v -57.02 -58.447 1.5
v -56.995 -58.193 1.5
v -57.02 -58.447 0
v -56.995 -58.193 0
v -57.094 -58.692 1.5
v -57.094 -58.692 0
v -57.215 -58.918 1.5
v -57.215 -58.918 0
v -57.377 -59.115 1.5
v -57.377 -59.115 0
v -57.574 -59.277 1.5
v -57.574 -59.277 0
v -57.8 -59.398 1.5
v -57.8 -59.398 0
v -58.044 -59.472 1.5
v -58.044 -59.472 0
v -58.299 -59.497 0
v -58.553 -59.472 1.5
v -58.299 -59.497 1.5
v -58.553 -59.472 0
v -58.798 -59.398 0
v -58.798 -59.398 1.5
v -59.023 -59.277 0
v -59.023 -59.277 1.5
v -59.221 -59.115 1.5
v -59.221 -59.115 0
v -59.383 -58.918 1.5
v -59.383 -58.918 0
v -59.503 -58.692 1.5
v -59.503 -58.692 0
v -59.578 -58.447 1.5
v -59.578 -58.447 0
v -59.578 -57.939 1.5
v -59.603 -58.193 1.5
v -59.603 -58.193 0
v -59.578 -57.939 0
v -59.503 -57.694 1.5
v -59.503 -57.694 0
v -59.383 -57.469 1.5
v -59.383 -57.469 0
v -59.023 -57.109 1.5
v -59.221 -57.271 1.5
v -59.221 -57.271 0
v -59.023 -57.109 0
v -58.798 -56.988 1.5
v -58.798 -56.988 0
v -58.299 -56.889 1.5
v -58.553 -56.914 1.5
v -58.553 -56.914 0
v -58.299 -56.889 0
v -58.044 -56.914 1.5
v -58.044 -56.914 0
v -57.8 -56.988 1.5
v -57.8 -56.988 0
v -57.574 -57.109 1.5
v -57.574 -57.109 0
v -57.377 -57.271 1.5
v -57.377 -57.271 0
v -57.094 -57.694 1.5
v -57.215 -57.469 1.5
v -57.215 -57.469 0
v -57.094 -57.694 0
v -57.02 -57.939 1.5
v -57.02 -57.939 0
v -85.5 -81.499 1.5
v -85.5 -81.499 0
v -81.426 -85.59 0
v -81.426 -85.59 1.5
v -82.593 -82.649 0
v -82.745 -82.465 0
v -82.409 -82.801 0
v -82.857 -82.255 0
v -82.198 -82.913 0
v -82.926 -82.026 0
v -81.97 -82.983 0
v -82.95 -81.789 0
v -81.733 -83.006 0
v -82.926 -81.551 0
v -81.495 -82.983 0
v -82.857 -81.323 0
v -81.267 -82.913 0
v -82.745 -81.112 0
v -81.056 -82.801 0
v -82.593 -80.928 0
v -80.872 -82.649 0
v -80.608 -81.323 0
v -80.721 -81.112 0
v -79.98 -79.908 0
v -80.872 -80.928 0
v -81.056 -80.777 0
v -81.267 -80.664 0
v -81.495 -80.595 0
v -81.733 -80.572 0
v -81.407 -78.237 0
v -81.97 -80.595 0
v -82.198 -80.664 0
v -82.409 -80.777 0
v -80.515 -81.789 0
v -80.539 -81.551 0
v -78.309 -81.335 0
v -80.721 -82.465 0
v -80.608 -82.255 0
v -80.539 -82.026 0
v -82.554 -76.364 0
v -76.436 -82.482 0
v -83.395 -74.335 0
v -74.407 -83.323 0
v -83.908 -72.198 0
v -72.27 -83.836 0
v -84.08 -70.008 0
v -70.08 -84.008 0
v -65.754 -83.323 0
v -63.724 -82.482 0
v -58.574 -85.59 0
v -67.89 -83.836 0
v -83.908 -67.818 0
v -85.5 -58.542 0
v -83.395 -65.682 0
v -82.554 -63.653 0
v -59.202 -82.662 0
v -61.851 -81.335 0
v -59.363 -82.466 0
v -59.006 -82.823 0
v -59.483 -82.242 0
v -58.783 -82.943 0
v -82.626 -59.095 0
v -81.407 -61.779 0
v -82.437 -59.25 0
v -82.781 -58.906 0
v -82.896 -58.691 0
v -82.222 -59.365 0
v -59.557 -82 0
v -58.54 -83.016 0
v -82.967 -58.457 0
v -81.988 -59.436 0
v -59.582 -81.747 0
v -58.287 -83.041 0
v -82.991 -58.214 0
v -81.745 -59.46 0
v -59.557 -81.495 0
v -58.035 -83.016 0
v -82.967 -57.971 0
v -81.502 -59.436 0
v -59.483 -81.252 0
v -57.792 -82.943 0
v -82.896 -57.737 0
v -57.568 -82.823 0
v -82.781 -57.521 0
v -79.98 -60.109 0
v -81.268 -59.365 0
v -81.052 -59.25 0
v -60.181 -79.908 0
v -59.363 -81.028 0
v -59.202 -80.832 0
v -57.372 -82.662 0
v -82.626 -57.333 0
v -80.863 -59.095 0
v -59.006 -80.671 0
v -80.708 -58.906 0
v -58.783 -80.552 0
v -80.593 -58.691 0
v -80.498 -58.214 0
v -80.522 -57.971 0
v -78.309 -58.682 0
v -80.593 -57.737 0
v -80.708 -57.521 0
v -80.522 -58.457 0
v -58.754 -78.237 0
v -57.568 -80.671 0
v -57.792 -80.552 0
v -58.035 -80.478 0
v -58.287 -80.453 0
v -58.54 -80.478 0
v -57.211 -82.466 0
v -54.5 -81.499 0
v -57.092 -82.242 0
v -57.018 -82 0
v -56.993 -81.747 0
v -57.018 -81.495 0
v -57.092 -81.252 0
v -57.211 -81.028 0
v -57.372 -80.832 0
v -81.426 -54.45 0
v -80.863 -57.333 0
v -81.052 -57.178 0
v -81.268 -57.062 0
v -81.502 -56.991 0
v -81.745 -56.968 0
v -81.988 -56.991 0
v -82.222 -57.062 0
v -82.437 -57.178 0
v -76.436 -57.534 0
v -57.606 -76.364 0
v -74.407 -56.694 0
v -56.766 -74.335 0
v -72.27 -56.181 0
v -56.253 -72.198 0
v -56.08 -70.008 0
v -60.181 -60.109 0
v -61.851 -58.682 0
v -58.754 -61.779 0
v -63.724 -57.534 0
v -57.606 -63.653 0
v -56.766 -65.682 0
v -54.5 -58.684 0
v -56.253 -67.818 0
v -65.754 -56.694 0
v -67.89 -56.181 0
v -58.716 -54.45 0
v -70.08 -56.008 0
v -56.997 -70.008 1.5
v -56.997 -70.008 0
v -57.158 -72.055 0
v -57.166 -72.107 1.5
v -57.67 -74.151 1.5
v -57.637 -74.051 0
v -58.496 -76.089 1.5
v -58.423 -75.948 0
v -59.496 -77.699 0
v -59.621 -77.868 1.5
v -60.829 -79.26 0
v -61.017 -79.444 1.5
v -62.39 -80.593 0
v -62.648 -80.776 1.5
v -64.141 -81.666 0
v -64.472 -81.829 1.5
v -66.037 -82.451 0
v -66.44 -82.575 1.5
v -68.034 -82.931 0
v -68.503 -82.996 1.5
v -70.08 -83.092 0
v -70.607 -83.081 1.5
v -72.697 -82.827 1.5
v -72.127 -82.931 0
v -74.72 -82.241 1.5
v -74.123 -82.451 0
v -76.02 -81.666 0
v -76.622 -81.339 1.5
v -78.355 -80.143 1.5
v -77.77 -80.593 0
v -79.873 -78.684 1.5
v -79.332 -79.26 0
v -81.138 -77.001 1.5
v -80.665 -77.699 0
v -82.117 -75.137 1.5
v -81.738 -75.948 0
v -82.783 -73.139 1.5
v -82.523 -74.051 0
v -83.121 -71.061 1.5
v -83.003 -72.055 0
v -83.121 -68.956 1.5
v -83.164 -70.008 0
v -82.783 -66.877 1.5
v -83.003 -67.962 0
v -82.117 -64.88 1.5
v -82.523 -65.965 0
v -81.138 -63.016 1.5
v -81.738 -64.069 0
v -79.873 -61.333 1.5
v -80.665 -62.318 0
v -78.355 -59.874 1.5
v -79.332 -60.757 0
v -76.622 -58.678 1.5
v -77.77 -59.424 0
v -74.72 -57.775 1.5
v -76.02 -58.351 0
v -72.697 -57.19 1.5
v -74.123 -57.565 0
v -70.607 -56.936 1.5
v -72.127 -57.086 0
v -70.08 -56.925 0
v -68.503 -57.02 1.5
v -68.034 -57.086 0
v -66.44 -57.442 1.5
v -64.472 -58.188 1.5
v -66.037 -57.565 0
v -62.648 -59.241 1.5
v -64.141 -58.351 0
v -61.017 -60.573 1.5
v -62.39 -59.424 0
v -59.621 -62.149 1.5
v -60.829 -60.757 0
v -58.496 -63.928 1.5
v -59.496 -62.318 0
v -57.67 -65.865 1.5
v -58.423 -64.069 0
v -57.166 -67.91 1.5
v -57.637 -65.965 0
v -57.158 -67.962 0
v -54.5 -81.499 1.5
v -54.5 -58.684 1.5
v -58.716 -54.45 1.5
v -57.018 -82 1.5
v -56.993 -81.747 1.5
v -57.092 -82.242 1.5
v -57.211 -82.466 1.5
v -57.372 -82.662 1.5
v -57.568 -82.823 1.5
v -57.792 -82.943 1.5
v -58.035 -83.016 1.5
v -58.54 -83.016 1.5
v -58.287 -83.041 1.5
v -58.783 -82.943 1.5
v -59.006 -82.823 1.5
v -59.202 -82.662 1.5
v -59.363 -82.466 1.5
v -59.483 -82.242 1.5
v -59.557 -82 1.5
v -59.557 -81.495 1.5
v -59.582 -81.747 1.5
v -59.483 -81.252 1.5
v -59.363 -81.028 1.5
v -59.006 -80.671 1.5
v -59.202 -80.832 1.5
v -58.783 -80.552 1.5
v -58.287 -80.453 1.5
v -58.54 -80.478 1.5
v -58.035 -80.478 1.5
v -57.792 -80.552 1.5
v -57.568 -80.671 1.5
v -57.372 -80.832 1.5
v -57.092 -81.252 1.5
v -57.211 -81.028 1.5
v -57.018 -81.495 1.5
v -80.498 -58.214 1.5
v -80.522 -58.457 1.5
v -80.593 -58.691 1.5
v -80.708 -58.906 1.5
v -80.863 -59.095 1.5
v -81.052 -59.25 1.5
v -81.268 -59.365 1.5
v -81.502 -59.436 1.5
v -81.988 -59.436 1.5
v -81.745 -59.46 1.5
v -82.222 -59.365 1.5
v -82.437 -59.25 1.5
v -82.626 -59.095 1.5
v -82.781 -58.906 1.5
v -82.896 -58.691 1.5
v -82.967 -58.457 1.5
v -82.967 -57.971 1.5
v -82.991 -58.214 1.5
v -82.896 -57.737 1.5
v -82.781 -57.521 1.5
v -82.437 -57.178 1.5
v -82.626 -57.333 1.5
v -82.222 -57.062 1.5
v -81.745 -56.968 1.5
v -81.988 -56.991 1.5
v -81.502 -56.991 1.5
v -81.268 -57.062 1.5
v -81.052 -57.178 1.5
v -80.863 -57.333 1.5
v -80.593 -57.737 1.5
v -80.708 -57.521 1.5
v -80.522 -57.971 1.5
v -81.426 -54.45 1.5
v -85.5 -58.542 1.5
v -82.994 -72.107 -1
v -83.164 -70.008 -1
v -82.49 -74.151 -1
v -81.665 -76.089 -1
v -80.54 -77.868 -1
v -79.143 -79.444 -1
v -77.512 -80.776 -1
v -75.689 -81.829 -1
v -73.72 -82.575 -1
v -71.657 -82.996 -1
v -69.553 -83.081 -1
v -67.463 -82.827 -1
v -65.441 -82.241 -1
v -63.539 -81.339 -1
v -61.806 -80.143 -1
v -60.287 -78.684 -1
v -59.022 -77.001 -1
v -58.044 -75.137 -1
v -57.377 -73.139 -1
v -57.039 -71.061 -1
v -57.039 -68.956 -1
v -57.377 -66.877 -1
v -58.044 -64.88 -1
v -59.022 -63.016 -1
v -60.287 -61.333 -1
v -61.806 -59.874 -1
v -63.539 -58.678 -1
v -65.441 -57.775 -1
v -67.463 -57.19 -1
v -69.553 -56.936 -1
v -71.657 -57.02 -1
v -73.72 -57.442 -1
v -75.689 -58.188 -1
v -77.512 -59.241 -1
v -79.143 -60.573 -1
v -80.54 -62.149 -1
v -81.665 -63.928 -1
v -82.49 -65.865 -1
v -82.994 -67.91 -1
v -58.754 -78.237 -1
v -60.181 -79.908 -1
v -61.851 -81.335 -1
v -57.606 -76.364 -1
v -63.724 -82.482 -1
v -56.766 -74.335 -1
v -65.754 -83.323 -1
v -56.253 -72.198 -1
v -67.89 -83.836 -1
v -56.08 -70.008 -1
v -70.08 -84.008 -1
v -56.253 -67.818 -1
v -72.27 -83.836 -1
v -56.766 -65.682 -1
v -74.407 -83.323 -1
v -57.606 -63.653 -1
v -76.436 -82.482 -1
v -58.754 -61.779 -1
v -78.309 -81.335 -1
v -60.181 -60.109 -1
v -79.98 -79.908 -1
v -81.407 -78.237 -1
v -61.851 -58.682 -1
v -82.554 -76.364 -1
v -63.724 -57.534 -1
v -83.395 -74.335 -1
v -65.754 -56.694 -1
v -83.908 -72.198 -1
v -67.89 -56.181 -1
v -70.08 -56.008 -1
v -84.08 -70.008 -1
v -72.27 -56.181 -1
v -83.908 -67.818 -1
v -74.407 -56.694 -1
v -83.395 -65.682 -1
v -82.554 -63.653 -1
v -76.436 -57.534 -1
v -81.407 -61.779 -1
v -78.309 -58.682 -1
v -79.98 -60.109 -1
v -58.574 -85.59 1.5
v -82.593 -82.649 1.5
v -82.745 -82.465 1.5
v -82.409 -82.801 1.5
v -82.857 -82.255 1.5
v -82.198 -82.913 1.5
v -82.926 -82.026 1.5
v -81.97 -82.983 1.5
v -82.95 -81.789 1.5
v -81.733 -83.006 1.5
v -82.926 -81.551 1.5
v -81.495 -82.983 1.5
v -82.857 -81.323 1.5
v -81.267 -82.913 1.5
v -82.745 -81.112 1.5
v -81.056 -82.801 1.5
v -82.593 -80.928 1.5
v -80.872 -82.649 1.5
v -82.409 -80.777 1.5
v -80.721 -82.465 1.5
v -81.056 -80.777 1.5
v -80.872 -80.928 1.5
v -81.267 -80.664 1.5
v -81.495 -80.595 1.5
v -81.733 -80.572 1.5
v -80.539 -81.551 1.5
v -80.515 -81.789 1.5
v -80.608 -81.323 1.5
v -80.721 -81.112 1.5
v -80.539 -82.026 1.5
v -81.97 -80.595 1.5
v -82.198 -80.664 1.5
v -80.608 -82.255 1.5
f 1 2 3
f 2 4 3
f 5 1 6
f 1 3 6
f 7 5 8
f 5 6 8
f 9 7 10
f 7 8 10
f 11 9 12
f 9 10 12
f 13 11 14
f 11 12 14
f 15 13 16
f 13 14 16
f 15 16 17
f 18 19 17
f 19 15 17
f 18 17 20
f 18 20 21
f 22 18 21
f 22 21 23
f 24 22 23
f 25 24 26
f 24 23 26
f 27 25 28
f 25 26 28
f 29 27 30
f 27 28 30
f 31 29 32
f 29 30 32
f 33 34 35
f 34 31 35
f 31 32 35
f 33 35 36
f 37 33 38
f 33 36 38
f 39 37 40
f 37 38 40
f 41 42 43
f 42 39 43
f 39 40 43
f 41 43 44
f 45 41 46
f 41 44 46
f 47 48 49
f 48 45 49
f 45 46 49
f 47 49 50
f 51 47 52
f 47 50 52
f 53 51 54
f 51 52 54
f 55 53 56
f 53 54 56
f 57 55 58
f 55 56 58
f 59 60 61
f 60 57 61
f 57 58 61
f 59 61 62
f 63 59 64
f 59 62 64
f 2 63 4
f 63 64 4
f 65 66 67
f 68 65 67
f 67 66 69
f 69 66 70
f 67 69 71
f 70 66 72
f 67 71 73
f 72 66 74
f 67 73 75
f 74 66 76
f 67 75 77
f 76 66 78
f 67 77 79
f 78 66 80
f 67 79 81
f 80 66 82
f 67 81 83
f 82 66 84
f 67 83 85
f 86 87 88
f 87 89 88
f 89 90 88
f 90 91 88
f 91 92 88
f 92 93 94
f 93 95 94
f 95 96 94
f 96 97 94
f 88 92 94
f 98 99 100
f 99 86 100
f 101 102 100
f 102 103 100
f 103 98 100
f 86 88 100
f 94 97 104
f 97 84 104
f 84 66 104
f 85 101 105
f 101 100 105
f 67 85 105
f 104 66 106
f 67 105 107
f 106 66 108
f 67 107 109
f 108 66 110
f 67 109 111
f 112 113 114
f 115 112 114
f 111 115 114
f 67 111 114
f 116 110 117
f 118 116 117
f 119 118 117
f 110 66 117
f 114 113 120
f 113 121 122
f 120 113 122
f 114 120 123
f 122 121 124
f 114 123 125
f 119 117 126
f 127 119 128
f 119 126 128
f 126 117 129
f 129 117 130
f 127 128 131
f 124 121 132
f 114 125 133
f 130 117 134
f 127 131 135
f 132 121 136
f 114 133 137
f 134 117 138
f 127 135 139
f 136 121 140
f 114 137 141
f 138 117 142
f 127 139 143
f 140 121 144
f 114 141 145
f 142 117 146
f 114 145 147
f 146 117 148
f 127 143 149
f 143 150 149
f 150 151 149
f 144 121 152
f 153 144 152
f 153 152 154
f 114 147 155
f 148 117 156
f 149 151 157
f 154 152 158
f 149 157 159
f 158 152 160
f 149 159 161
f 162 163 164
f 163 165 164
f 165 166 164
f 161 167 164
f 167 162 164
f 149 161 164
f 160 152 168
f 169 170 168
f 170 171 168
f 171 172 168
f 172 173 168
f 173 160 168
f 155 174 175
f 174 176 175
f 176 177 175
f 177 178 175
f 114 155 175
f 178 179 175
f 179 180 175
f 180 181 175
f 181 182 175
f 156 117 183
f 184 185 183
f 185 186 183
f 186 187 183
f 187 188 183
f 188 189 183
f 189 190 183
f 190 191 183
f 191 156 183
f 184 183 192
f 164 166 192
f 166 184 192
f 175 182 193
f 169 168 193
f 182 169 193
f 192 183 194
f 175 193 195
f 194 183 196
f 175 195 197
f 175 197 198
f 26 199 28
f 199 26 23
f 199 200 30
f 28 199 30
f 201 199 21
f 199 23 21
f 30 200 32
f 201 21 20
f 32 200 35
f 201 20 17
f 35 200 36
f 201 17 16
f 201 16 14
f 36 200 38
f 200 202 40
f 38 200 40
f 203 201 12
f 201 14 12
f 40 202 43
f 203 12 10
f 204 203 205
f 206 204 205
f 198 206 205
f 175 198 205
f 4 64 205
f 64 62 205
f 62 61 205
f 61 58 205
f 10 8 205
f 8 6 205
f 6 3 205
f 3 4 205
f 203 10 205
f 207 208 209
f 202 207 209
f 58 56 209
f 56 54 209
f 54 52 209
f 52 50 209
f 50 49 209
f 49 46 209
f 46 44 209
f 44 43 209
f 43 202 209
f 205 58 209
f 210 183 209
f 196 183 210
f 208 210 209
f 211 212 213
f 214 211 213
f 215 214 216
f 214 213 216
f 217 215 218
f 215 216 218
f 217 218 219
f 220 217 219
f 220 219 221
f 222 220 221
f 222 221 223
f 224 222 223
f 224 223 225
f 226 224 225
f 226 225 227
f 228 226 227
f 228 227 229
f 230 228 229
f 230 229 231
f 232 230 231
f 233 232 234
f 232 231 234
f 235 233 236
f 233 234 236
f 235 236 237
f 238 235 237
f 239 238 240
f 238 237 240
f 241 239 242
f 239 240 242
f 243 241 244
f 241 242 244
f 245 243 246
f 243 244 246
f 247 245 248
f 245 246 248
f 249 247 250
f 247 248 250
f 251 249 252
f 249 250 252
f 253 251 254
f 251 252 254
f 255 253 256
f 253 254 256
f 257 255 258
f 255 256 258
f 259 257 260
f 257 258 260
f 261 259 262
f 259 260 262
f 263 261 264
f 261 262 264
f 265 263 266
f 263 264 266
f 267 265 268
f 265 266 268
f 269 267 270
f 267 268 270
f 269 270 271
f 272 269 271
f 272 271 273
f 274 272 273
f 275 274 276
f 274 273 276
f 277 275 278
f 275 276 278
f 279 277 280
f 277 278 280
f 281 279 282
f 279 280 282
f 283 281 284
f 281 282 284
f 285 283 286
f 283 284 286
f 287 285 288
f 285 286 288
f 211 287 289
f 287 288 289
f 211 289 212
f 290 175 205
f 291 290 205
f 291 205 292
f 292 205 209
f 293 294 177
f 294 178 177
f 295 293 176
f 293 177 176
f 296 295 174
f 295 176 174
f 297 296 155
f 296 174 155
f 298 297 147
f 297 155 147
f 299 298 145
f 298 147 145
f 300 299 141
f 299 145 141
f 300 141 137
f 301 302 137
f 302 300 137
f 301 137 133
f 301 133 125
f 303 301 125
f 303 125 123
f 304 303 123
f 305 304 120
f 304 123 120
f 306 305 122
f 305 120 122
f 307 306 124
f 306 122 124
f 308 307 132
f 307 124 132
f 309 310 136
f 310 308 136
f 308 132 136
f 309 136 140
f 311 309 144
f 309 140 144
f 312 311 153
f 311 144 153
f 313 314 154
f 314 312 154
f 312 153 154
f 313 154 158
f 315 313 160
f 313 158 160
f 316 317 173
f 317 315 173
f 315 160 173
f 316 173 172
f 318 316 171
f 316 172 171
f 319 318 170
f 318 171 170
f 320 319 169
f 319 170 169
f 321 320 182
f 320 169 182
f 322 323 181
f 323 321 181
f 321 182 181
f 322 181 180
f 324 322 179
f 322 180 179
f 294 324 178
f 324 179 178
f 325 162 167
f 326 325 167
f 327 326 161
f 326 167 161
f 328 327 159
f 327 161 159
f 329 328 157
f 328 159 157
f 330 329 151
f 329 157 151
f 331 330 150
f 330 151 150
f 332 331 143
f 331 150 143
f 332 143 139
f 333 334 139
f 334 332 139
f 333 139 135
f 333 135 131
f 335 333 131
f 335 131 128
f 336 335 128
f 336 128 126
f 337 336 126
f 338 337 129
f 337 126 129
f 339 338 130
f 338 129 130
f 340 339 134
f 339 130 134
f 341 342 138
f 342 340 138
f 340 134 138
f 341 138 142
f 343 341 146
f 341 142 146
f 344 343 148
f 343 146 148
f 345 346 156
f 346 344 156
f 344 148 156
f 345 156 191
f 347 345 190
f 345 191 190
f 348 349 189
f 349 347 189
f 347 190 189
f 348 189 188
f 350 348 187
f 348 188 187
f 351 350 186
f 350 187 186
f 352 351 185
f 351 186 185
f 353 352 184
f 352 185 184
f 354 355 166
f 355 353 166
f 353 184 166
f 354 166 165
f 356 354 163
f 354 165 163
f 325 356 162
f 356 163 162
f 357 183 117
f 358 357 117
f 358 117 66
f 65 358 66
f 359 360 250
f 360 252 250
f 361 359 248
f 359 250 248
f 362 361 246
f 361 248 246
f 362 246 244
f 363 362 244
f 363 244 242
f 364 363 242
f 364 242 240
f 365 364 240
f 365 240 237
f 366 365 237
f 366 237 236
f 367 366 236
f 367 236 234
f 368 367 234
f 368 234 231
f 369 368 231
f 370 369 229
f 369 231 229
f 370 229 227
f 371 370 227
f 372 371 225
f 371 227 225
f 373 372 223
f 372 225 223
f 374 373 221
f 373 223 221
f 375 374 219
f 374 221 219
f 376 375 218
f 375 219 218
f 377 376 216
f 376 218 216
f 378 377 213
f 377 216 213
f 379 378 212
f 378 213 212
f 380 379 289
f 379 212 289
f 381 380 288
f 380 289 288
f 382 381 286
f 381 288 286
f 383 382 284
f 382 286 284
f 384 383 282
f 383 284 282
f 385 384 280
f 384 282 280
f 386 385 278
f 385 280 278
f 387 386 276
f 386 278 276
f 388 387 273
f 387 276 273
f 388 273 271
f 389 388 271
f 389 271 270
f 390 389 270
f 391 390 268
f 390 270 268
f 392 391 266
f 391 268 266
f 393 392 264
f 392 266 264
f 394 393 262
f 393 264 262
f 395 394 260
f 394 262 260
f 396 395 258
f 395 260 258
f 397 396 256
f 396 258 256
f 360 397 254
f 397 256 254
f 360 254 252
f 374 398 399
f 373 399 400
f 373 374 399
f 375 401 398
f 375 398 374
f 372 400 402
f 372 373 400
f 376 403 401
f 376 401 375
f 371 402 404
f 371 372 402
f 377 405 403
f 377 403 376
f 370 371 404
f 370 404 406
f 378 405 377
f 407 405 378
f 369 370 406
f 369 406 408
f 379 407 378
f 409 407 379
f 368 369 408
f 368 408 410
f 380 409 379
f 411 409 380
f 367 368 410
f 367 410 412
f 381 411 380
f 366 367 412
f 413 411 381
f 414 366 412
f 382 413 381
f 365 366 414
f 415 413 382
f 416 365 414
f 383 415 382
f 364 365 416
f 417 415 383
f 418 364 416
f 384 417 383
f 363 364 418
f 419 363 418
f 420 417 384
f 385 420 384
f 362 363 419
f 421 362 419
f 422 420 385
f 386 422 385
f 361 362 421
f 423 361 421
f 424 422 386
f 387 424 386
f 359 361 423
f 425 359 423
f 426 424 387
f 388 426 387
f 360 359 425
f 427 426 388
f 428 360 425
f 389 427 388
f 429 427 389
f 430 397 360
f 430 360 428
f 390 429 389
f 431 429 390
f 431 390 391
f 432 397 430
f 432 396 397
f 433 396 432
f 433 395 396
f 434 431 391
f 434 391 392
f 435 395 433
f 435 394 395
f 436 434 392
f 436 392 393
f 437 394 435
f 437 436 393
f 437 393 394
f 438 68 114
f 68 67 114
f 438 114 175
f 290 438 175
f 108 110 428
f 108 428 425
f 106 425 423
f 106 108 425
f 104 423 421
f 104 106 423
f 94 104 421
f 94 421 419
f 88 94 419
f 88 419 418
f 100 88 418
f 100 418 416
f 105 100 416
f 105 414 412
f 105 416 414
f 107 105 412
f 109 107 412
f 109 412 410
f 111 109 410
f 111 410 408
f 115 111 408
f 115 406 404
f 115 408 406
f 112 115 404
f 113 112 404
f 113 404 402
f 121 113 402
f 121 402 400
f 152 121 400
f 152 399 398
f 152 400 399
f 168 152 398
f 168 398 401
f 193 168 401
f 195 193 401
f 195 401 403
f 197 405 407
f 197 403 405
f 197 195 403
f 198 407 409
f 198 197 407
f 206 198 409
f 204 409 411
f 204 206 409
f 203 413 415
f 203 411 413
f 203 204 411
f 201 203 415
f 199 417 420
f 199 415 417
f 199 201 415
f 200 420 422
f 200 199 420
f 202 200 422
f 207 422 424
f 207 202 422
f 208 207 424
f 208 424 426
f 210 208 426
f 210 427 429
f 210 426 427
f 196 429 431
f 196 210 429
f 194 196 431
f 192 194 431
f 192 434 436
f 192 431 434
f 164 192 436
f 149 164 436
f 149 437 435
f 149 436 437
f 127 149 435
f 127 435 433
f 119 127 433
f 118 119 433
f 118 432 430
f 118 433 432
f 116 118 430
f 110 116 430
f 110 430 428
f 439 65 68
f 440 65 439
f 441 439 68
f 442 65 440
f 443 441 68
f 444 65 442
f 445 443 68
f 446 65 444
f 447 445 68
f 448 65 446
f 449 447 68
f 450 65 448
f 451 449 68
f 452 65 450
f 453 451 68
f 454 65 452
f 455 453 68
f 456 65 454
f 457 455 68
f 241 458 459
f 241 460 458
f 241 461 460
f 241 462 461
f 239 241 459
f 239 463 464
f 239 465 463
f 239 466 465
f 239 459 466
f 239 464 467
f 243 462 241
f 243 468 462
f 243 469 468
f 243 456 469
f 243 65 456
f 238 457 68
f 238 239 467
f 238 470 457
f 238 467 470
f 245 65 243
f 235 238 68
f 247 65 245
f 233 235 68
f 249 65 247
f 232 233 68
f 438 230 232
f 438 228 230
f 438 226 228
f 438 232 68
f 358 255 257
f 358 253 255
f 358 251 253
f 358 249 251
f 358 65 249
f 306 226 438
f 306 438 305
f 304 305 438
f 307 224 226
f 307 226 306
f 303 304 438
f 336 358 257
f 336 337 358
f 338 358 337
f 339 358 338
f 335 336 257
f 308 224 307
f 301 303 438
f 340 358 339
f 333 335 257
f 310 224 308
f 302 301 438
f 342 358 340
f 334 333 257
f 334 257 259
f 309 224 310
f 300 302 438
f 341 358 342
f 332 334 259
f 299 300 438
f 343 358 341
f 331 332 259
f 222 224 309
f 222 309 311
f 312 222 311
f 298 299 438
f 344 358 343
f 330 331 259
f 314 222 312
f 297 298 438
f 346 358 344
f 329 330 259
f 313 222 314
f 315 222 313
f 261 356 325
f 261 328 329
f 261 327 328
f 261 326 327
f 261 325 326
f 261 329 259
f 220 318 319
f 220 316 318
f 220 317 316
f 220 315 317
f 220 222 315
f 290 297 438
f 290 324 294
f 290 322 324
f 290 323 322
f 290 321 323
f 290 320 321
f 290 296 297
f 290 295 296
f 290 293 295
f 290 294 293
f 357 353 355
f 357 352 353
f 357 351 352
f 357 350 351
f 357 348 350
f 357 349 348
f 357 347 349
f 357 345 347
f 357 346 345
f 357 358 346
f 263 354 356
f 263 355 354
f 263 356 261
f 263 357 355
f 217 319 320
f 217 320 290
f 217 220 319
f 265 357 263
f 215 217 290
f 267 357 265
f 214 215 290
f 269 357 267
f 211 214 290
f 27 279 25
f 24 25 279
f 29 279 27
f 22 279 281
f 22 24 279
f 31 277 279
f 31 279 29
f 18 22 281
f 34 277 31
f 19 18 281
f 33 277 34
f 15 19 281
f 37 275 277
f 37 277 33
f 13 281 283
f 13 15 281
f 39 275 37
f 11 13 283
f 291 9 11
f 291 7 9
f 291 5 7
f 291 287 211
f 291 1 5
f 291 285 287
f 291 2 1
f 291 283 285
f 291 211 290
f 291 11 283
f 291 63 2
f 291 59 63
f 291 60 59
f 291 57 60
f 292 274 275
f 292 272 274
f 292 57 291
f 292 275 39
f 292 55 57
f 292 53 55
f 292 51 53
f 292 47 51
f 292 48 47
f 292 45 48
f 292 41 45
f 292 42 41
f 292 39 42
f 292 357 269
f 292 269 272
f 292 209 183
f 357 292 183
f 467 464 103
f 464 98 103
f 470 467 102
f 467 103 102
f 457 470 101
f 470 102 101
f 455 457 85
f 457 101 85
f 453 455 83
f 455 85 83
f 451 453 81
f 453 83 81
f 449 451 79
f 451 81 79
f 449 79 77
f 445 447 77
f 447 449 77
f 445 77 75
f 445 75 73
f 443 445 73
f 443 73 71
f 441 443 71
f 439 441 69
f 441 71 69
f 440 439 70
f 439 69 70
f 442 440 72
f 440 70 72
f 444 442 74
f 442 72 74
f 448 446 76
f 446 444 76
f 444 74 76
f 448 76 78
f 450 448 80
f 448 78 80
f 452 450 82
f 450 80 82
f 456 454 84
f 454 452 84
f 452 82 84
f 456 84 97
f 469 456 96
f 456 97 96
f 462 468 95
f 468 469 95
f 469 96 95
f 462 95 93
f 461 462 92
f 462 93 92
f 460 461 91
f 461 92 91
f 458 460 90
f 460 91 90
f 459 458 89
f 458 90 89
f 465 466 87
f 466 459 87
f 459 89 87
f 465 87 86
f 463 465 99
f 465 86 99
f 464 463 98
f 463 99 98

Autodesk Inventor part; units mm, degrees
ref_plane "YZ Plane" through (0, 0, 0) normal (1, 0, 0) x (0, 1, 0)
ref_plane "XZ Plane" through (0, 0, 0) normal (0, 1, 0) x (-1, 0, 0)
ref_plane "XY Plane" through (0, 0, 0) normal (0, 0, 1) x (1, 0, 0)
ref_plane "Arbeitsebene1" through (-58.716, -54.45, 1.8) normal (0, 0, 1) x (1, 0, 0)
sketch "Skizze1" plane through (-58.716, -54.45, 0) normal (0, 0, 1) x (1, 0, 0)
  circle A0 centre (-11.3643, -15.5584) radius 13.0833
  line L0 (4.216, -27.049) -> (4.216, -4.234)
  line L1 (4.216, -4.234) -> (0, 0)
  line L2 (0, 0) -> (-22.71, 0)
  line L3 (-22.71, 0) -> (-26.784, -4.092)
  line L4 (-26.784, -4.092) -> (-26.784, -27.049)
  line L5 (-26.784, -27.049) -> (-22.71, -31.14)
  line L6 (-22.71, -31.14) -> (0.142, -31.14)
  line L7 (0.142, -31.14) -> (4.216, -27.049)
  circle A1 centre (0.4286, -27.2971) radius 1.2941
  circle A2 centre (0.4173, -3.7431) radius 1.3039
  circle A3 centre (-23.0288, -3.7639) radius 1.2464
  circle A4 centre (-23.0166, -27.3387) radius 1.2172
  point P0 (58.716, 54.45)
extrude "Extrusion1" add sketch "Skizze1" along normal blind 1.5
sketch "Skizze2" plane through (-58.716, -54.45, 0) normal (0, 0, -1) x (-1, 0, 0)
  circle A0 centre (11.3643, -15.5584) radius 13.0833 projected
  circle A1 centre (11.3643, -15.5584) radius 14
  point P0 (-58.716, 54.45)
  dimension "d2" = 28
extrude "Extrusion2" add sketch "Skizze2" along normal blind 1
properties part number "Pump_Lid"
